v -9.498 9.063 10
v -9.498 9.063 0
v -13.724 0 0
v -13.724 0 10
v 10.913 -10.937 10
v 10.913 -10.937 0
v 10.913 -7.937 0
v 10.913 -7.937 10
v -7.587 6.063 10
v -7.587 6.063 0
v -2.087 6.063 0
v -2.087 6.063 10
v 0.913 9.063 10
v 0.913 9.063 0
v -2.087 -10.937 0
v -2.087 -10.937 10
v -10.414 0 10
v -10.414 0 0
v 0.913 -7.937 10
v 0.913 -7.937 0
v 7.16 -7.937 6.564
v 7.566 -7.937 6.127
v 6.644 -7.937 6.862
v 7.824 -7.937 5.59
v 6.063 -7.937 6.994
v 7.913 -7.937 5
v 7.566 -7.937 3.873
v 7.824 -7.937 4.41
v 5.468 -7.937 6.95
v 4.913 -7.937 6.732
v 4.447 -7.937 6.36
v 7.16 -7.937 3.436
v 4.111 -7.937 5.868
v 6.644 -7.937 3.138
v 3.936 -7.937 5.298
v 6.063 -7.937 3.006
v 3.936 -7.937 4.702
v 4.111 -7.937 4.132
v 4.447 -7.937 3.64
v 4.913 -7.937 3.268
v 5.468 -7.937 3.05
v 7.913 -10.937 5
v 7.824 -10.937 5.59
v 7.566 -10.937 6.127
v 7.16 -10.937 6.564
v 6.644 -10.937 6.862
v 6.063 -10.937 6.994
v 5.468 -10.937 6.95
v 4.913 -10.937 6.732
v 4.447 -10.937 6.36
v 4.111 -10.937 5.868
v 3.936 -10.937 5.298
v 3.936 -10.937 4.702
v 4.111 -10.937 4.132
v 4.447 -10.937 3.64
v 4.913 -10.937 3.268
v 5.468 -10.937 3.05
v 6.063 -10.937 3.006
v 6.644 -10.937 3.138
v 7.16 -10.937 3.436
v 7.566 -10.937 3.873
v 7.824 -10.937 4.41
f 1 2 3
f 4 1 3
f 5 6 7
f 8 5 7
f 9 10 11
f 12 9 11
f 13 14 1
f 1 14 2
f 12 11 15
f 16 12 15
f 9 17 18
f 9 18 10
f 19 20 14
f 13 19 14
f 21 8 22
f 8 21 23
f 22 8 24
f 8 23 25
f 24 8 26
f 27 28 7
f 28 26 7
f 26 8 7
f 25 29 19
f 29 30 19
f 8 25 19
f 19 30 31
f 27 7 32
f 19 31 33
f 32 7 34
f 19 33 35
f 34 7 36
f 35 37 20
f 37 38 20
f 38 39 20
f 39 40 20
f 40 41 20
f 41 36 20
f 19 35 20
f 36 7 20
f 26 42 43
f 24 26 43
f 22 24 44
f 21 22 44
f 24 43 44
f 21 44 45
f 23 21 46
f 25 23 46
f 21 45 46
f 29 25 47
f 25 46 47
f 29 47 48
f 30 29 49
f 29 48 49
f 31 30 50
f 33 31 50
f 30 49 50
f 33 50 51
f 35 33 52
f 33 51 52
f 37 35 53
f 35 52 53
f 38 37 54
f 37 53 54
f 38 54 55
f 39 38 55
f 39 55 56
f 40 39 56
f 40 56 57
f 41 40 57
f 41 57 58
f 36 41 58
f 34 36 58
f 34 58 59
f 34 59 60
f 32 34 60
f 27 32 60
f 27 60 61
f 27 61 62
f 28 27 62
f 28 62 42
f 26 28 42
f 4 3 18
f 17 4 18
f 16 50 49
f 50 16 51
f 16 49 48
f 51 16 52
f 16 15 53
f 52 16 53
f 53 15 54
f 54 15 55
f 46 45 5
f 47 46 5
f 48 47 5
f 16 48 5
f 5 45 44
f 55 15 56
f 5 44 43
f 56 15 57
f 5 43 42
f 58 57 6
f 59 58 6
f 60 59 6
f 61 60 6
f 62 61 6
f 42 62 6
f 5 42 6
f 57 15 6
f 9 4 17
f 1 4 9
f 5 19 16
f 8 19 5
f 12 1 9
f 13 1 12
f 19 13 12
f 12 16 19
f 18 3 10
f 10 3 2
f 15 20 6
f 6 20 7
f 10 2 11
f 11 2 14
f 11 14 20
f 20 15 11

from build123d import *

# Parameters (mm, degrees)
F1_DEPTH = 10
F3_D     = 4


with BuildPart() as f1:
    # F0 (on Top) → F1 (new body)
    with BuildSketch(Plane.XY):
        Polygon((-2.086833, -10.936922), (10.913167, -10.936922), (10.913167, -7.936922), (0.913167, -7.936922), (0.913167, 9.063078), (-9.498044, 9.063078), (-13.724226, 0), (-10.414093, 0), (-7.586833, 6.063078), (-2.086833, 6.063078), align=None)
    extrude(amount=F1_DEPTH)

    # F3 (through all)
    with Locations(Plane(origin=(0, -7.936922, 0), x_dir=(-1, 0, 0), z_dir=(0, 1, 0))):
        with Locations((-5.913167, 5)):
            Hole(F3_D / 2)


solid = f1.part
